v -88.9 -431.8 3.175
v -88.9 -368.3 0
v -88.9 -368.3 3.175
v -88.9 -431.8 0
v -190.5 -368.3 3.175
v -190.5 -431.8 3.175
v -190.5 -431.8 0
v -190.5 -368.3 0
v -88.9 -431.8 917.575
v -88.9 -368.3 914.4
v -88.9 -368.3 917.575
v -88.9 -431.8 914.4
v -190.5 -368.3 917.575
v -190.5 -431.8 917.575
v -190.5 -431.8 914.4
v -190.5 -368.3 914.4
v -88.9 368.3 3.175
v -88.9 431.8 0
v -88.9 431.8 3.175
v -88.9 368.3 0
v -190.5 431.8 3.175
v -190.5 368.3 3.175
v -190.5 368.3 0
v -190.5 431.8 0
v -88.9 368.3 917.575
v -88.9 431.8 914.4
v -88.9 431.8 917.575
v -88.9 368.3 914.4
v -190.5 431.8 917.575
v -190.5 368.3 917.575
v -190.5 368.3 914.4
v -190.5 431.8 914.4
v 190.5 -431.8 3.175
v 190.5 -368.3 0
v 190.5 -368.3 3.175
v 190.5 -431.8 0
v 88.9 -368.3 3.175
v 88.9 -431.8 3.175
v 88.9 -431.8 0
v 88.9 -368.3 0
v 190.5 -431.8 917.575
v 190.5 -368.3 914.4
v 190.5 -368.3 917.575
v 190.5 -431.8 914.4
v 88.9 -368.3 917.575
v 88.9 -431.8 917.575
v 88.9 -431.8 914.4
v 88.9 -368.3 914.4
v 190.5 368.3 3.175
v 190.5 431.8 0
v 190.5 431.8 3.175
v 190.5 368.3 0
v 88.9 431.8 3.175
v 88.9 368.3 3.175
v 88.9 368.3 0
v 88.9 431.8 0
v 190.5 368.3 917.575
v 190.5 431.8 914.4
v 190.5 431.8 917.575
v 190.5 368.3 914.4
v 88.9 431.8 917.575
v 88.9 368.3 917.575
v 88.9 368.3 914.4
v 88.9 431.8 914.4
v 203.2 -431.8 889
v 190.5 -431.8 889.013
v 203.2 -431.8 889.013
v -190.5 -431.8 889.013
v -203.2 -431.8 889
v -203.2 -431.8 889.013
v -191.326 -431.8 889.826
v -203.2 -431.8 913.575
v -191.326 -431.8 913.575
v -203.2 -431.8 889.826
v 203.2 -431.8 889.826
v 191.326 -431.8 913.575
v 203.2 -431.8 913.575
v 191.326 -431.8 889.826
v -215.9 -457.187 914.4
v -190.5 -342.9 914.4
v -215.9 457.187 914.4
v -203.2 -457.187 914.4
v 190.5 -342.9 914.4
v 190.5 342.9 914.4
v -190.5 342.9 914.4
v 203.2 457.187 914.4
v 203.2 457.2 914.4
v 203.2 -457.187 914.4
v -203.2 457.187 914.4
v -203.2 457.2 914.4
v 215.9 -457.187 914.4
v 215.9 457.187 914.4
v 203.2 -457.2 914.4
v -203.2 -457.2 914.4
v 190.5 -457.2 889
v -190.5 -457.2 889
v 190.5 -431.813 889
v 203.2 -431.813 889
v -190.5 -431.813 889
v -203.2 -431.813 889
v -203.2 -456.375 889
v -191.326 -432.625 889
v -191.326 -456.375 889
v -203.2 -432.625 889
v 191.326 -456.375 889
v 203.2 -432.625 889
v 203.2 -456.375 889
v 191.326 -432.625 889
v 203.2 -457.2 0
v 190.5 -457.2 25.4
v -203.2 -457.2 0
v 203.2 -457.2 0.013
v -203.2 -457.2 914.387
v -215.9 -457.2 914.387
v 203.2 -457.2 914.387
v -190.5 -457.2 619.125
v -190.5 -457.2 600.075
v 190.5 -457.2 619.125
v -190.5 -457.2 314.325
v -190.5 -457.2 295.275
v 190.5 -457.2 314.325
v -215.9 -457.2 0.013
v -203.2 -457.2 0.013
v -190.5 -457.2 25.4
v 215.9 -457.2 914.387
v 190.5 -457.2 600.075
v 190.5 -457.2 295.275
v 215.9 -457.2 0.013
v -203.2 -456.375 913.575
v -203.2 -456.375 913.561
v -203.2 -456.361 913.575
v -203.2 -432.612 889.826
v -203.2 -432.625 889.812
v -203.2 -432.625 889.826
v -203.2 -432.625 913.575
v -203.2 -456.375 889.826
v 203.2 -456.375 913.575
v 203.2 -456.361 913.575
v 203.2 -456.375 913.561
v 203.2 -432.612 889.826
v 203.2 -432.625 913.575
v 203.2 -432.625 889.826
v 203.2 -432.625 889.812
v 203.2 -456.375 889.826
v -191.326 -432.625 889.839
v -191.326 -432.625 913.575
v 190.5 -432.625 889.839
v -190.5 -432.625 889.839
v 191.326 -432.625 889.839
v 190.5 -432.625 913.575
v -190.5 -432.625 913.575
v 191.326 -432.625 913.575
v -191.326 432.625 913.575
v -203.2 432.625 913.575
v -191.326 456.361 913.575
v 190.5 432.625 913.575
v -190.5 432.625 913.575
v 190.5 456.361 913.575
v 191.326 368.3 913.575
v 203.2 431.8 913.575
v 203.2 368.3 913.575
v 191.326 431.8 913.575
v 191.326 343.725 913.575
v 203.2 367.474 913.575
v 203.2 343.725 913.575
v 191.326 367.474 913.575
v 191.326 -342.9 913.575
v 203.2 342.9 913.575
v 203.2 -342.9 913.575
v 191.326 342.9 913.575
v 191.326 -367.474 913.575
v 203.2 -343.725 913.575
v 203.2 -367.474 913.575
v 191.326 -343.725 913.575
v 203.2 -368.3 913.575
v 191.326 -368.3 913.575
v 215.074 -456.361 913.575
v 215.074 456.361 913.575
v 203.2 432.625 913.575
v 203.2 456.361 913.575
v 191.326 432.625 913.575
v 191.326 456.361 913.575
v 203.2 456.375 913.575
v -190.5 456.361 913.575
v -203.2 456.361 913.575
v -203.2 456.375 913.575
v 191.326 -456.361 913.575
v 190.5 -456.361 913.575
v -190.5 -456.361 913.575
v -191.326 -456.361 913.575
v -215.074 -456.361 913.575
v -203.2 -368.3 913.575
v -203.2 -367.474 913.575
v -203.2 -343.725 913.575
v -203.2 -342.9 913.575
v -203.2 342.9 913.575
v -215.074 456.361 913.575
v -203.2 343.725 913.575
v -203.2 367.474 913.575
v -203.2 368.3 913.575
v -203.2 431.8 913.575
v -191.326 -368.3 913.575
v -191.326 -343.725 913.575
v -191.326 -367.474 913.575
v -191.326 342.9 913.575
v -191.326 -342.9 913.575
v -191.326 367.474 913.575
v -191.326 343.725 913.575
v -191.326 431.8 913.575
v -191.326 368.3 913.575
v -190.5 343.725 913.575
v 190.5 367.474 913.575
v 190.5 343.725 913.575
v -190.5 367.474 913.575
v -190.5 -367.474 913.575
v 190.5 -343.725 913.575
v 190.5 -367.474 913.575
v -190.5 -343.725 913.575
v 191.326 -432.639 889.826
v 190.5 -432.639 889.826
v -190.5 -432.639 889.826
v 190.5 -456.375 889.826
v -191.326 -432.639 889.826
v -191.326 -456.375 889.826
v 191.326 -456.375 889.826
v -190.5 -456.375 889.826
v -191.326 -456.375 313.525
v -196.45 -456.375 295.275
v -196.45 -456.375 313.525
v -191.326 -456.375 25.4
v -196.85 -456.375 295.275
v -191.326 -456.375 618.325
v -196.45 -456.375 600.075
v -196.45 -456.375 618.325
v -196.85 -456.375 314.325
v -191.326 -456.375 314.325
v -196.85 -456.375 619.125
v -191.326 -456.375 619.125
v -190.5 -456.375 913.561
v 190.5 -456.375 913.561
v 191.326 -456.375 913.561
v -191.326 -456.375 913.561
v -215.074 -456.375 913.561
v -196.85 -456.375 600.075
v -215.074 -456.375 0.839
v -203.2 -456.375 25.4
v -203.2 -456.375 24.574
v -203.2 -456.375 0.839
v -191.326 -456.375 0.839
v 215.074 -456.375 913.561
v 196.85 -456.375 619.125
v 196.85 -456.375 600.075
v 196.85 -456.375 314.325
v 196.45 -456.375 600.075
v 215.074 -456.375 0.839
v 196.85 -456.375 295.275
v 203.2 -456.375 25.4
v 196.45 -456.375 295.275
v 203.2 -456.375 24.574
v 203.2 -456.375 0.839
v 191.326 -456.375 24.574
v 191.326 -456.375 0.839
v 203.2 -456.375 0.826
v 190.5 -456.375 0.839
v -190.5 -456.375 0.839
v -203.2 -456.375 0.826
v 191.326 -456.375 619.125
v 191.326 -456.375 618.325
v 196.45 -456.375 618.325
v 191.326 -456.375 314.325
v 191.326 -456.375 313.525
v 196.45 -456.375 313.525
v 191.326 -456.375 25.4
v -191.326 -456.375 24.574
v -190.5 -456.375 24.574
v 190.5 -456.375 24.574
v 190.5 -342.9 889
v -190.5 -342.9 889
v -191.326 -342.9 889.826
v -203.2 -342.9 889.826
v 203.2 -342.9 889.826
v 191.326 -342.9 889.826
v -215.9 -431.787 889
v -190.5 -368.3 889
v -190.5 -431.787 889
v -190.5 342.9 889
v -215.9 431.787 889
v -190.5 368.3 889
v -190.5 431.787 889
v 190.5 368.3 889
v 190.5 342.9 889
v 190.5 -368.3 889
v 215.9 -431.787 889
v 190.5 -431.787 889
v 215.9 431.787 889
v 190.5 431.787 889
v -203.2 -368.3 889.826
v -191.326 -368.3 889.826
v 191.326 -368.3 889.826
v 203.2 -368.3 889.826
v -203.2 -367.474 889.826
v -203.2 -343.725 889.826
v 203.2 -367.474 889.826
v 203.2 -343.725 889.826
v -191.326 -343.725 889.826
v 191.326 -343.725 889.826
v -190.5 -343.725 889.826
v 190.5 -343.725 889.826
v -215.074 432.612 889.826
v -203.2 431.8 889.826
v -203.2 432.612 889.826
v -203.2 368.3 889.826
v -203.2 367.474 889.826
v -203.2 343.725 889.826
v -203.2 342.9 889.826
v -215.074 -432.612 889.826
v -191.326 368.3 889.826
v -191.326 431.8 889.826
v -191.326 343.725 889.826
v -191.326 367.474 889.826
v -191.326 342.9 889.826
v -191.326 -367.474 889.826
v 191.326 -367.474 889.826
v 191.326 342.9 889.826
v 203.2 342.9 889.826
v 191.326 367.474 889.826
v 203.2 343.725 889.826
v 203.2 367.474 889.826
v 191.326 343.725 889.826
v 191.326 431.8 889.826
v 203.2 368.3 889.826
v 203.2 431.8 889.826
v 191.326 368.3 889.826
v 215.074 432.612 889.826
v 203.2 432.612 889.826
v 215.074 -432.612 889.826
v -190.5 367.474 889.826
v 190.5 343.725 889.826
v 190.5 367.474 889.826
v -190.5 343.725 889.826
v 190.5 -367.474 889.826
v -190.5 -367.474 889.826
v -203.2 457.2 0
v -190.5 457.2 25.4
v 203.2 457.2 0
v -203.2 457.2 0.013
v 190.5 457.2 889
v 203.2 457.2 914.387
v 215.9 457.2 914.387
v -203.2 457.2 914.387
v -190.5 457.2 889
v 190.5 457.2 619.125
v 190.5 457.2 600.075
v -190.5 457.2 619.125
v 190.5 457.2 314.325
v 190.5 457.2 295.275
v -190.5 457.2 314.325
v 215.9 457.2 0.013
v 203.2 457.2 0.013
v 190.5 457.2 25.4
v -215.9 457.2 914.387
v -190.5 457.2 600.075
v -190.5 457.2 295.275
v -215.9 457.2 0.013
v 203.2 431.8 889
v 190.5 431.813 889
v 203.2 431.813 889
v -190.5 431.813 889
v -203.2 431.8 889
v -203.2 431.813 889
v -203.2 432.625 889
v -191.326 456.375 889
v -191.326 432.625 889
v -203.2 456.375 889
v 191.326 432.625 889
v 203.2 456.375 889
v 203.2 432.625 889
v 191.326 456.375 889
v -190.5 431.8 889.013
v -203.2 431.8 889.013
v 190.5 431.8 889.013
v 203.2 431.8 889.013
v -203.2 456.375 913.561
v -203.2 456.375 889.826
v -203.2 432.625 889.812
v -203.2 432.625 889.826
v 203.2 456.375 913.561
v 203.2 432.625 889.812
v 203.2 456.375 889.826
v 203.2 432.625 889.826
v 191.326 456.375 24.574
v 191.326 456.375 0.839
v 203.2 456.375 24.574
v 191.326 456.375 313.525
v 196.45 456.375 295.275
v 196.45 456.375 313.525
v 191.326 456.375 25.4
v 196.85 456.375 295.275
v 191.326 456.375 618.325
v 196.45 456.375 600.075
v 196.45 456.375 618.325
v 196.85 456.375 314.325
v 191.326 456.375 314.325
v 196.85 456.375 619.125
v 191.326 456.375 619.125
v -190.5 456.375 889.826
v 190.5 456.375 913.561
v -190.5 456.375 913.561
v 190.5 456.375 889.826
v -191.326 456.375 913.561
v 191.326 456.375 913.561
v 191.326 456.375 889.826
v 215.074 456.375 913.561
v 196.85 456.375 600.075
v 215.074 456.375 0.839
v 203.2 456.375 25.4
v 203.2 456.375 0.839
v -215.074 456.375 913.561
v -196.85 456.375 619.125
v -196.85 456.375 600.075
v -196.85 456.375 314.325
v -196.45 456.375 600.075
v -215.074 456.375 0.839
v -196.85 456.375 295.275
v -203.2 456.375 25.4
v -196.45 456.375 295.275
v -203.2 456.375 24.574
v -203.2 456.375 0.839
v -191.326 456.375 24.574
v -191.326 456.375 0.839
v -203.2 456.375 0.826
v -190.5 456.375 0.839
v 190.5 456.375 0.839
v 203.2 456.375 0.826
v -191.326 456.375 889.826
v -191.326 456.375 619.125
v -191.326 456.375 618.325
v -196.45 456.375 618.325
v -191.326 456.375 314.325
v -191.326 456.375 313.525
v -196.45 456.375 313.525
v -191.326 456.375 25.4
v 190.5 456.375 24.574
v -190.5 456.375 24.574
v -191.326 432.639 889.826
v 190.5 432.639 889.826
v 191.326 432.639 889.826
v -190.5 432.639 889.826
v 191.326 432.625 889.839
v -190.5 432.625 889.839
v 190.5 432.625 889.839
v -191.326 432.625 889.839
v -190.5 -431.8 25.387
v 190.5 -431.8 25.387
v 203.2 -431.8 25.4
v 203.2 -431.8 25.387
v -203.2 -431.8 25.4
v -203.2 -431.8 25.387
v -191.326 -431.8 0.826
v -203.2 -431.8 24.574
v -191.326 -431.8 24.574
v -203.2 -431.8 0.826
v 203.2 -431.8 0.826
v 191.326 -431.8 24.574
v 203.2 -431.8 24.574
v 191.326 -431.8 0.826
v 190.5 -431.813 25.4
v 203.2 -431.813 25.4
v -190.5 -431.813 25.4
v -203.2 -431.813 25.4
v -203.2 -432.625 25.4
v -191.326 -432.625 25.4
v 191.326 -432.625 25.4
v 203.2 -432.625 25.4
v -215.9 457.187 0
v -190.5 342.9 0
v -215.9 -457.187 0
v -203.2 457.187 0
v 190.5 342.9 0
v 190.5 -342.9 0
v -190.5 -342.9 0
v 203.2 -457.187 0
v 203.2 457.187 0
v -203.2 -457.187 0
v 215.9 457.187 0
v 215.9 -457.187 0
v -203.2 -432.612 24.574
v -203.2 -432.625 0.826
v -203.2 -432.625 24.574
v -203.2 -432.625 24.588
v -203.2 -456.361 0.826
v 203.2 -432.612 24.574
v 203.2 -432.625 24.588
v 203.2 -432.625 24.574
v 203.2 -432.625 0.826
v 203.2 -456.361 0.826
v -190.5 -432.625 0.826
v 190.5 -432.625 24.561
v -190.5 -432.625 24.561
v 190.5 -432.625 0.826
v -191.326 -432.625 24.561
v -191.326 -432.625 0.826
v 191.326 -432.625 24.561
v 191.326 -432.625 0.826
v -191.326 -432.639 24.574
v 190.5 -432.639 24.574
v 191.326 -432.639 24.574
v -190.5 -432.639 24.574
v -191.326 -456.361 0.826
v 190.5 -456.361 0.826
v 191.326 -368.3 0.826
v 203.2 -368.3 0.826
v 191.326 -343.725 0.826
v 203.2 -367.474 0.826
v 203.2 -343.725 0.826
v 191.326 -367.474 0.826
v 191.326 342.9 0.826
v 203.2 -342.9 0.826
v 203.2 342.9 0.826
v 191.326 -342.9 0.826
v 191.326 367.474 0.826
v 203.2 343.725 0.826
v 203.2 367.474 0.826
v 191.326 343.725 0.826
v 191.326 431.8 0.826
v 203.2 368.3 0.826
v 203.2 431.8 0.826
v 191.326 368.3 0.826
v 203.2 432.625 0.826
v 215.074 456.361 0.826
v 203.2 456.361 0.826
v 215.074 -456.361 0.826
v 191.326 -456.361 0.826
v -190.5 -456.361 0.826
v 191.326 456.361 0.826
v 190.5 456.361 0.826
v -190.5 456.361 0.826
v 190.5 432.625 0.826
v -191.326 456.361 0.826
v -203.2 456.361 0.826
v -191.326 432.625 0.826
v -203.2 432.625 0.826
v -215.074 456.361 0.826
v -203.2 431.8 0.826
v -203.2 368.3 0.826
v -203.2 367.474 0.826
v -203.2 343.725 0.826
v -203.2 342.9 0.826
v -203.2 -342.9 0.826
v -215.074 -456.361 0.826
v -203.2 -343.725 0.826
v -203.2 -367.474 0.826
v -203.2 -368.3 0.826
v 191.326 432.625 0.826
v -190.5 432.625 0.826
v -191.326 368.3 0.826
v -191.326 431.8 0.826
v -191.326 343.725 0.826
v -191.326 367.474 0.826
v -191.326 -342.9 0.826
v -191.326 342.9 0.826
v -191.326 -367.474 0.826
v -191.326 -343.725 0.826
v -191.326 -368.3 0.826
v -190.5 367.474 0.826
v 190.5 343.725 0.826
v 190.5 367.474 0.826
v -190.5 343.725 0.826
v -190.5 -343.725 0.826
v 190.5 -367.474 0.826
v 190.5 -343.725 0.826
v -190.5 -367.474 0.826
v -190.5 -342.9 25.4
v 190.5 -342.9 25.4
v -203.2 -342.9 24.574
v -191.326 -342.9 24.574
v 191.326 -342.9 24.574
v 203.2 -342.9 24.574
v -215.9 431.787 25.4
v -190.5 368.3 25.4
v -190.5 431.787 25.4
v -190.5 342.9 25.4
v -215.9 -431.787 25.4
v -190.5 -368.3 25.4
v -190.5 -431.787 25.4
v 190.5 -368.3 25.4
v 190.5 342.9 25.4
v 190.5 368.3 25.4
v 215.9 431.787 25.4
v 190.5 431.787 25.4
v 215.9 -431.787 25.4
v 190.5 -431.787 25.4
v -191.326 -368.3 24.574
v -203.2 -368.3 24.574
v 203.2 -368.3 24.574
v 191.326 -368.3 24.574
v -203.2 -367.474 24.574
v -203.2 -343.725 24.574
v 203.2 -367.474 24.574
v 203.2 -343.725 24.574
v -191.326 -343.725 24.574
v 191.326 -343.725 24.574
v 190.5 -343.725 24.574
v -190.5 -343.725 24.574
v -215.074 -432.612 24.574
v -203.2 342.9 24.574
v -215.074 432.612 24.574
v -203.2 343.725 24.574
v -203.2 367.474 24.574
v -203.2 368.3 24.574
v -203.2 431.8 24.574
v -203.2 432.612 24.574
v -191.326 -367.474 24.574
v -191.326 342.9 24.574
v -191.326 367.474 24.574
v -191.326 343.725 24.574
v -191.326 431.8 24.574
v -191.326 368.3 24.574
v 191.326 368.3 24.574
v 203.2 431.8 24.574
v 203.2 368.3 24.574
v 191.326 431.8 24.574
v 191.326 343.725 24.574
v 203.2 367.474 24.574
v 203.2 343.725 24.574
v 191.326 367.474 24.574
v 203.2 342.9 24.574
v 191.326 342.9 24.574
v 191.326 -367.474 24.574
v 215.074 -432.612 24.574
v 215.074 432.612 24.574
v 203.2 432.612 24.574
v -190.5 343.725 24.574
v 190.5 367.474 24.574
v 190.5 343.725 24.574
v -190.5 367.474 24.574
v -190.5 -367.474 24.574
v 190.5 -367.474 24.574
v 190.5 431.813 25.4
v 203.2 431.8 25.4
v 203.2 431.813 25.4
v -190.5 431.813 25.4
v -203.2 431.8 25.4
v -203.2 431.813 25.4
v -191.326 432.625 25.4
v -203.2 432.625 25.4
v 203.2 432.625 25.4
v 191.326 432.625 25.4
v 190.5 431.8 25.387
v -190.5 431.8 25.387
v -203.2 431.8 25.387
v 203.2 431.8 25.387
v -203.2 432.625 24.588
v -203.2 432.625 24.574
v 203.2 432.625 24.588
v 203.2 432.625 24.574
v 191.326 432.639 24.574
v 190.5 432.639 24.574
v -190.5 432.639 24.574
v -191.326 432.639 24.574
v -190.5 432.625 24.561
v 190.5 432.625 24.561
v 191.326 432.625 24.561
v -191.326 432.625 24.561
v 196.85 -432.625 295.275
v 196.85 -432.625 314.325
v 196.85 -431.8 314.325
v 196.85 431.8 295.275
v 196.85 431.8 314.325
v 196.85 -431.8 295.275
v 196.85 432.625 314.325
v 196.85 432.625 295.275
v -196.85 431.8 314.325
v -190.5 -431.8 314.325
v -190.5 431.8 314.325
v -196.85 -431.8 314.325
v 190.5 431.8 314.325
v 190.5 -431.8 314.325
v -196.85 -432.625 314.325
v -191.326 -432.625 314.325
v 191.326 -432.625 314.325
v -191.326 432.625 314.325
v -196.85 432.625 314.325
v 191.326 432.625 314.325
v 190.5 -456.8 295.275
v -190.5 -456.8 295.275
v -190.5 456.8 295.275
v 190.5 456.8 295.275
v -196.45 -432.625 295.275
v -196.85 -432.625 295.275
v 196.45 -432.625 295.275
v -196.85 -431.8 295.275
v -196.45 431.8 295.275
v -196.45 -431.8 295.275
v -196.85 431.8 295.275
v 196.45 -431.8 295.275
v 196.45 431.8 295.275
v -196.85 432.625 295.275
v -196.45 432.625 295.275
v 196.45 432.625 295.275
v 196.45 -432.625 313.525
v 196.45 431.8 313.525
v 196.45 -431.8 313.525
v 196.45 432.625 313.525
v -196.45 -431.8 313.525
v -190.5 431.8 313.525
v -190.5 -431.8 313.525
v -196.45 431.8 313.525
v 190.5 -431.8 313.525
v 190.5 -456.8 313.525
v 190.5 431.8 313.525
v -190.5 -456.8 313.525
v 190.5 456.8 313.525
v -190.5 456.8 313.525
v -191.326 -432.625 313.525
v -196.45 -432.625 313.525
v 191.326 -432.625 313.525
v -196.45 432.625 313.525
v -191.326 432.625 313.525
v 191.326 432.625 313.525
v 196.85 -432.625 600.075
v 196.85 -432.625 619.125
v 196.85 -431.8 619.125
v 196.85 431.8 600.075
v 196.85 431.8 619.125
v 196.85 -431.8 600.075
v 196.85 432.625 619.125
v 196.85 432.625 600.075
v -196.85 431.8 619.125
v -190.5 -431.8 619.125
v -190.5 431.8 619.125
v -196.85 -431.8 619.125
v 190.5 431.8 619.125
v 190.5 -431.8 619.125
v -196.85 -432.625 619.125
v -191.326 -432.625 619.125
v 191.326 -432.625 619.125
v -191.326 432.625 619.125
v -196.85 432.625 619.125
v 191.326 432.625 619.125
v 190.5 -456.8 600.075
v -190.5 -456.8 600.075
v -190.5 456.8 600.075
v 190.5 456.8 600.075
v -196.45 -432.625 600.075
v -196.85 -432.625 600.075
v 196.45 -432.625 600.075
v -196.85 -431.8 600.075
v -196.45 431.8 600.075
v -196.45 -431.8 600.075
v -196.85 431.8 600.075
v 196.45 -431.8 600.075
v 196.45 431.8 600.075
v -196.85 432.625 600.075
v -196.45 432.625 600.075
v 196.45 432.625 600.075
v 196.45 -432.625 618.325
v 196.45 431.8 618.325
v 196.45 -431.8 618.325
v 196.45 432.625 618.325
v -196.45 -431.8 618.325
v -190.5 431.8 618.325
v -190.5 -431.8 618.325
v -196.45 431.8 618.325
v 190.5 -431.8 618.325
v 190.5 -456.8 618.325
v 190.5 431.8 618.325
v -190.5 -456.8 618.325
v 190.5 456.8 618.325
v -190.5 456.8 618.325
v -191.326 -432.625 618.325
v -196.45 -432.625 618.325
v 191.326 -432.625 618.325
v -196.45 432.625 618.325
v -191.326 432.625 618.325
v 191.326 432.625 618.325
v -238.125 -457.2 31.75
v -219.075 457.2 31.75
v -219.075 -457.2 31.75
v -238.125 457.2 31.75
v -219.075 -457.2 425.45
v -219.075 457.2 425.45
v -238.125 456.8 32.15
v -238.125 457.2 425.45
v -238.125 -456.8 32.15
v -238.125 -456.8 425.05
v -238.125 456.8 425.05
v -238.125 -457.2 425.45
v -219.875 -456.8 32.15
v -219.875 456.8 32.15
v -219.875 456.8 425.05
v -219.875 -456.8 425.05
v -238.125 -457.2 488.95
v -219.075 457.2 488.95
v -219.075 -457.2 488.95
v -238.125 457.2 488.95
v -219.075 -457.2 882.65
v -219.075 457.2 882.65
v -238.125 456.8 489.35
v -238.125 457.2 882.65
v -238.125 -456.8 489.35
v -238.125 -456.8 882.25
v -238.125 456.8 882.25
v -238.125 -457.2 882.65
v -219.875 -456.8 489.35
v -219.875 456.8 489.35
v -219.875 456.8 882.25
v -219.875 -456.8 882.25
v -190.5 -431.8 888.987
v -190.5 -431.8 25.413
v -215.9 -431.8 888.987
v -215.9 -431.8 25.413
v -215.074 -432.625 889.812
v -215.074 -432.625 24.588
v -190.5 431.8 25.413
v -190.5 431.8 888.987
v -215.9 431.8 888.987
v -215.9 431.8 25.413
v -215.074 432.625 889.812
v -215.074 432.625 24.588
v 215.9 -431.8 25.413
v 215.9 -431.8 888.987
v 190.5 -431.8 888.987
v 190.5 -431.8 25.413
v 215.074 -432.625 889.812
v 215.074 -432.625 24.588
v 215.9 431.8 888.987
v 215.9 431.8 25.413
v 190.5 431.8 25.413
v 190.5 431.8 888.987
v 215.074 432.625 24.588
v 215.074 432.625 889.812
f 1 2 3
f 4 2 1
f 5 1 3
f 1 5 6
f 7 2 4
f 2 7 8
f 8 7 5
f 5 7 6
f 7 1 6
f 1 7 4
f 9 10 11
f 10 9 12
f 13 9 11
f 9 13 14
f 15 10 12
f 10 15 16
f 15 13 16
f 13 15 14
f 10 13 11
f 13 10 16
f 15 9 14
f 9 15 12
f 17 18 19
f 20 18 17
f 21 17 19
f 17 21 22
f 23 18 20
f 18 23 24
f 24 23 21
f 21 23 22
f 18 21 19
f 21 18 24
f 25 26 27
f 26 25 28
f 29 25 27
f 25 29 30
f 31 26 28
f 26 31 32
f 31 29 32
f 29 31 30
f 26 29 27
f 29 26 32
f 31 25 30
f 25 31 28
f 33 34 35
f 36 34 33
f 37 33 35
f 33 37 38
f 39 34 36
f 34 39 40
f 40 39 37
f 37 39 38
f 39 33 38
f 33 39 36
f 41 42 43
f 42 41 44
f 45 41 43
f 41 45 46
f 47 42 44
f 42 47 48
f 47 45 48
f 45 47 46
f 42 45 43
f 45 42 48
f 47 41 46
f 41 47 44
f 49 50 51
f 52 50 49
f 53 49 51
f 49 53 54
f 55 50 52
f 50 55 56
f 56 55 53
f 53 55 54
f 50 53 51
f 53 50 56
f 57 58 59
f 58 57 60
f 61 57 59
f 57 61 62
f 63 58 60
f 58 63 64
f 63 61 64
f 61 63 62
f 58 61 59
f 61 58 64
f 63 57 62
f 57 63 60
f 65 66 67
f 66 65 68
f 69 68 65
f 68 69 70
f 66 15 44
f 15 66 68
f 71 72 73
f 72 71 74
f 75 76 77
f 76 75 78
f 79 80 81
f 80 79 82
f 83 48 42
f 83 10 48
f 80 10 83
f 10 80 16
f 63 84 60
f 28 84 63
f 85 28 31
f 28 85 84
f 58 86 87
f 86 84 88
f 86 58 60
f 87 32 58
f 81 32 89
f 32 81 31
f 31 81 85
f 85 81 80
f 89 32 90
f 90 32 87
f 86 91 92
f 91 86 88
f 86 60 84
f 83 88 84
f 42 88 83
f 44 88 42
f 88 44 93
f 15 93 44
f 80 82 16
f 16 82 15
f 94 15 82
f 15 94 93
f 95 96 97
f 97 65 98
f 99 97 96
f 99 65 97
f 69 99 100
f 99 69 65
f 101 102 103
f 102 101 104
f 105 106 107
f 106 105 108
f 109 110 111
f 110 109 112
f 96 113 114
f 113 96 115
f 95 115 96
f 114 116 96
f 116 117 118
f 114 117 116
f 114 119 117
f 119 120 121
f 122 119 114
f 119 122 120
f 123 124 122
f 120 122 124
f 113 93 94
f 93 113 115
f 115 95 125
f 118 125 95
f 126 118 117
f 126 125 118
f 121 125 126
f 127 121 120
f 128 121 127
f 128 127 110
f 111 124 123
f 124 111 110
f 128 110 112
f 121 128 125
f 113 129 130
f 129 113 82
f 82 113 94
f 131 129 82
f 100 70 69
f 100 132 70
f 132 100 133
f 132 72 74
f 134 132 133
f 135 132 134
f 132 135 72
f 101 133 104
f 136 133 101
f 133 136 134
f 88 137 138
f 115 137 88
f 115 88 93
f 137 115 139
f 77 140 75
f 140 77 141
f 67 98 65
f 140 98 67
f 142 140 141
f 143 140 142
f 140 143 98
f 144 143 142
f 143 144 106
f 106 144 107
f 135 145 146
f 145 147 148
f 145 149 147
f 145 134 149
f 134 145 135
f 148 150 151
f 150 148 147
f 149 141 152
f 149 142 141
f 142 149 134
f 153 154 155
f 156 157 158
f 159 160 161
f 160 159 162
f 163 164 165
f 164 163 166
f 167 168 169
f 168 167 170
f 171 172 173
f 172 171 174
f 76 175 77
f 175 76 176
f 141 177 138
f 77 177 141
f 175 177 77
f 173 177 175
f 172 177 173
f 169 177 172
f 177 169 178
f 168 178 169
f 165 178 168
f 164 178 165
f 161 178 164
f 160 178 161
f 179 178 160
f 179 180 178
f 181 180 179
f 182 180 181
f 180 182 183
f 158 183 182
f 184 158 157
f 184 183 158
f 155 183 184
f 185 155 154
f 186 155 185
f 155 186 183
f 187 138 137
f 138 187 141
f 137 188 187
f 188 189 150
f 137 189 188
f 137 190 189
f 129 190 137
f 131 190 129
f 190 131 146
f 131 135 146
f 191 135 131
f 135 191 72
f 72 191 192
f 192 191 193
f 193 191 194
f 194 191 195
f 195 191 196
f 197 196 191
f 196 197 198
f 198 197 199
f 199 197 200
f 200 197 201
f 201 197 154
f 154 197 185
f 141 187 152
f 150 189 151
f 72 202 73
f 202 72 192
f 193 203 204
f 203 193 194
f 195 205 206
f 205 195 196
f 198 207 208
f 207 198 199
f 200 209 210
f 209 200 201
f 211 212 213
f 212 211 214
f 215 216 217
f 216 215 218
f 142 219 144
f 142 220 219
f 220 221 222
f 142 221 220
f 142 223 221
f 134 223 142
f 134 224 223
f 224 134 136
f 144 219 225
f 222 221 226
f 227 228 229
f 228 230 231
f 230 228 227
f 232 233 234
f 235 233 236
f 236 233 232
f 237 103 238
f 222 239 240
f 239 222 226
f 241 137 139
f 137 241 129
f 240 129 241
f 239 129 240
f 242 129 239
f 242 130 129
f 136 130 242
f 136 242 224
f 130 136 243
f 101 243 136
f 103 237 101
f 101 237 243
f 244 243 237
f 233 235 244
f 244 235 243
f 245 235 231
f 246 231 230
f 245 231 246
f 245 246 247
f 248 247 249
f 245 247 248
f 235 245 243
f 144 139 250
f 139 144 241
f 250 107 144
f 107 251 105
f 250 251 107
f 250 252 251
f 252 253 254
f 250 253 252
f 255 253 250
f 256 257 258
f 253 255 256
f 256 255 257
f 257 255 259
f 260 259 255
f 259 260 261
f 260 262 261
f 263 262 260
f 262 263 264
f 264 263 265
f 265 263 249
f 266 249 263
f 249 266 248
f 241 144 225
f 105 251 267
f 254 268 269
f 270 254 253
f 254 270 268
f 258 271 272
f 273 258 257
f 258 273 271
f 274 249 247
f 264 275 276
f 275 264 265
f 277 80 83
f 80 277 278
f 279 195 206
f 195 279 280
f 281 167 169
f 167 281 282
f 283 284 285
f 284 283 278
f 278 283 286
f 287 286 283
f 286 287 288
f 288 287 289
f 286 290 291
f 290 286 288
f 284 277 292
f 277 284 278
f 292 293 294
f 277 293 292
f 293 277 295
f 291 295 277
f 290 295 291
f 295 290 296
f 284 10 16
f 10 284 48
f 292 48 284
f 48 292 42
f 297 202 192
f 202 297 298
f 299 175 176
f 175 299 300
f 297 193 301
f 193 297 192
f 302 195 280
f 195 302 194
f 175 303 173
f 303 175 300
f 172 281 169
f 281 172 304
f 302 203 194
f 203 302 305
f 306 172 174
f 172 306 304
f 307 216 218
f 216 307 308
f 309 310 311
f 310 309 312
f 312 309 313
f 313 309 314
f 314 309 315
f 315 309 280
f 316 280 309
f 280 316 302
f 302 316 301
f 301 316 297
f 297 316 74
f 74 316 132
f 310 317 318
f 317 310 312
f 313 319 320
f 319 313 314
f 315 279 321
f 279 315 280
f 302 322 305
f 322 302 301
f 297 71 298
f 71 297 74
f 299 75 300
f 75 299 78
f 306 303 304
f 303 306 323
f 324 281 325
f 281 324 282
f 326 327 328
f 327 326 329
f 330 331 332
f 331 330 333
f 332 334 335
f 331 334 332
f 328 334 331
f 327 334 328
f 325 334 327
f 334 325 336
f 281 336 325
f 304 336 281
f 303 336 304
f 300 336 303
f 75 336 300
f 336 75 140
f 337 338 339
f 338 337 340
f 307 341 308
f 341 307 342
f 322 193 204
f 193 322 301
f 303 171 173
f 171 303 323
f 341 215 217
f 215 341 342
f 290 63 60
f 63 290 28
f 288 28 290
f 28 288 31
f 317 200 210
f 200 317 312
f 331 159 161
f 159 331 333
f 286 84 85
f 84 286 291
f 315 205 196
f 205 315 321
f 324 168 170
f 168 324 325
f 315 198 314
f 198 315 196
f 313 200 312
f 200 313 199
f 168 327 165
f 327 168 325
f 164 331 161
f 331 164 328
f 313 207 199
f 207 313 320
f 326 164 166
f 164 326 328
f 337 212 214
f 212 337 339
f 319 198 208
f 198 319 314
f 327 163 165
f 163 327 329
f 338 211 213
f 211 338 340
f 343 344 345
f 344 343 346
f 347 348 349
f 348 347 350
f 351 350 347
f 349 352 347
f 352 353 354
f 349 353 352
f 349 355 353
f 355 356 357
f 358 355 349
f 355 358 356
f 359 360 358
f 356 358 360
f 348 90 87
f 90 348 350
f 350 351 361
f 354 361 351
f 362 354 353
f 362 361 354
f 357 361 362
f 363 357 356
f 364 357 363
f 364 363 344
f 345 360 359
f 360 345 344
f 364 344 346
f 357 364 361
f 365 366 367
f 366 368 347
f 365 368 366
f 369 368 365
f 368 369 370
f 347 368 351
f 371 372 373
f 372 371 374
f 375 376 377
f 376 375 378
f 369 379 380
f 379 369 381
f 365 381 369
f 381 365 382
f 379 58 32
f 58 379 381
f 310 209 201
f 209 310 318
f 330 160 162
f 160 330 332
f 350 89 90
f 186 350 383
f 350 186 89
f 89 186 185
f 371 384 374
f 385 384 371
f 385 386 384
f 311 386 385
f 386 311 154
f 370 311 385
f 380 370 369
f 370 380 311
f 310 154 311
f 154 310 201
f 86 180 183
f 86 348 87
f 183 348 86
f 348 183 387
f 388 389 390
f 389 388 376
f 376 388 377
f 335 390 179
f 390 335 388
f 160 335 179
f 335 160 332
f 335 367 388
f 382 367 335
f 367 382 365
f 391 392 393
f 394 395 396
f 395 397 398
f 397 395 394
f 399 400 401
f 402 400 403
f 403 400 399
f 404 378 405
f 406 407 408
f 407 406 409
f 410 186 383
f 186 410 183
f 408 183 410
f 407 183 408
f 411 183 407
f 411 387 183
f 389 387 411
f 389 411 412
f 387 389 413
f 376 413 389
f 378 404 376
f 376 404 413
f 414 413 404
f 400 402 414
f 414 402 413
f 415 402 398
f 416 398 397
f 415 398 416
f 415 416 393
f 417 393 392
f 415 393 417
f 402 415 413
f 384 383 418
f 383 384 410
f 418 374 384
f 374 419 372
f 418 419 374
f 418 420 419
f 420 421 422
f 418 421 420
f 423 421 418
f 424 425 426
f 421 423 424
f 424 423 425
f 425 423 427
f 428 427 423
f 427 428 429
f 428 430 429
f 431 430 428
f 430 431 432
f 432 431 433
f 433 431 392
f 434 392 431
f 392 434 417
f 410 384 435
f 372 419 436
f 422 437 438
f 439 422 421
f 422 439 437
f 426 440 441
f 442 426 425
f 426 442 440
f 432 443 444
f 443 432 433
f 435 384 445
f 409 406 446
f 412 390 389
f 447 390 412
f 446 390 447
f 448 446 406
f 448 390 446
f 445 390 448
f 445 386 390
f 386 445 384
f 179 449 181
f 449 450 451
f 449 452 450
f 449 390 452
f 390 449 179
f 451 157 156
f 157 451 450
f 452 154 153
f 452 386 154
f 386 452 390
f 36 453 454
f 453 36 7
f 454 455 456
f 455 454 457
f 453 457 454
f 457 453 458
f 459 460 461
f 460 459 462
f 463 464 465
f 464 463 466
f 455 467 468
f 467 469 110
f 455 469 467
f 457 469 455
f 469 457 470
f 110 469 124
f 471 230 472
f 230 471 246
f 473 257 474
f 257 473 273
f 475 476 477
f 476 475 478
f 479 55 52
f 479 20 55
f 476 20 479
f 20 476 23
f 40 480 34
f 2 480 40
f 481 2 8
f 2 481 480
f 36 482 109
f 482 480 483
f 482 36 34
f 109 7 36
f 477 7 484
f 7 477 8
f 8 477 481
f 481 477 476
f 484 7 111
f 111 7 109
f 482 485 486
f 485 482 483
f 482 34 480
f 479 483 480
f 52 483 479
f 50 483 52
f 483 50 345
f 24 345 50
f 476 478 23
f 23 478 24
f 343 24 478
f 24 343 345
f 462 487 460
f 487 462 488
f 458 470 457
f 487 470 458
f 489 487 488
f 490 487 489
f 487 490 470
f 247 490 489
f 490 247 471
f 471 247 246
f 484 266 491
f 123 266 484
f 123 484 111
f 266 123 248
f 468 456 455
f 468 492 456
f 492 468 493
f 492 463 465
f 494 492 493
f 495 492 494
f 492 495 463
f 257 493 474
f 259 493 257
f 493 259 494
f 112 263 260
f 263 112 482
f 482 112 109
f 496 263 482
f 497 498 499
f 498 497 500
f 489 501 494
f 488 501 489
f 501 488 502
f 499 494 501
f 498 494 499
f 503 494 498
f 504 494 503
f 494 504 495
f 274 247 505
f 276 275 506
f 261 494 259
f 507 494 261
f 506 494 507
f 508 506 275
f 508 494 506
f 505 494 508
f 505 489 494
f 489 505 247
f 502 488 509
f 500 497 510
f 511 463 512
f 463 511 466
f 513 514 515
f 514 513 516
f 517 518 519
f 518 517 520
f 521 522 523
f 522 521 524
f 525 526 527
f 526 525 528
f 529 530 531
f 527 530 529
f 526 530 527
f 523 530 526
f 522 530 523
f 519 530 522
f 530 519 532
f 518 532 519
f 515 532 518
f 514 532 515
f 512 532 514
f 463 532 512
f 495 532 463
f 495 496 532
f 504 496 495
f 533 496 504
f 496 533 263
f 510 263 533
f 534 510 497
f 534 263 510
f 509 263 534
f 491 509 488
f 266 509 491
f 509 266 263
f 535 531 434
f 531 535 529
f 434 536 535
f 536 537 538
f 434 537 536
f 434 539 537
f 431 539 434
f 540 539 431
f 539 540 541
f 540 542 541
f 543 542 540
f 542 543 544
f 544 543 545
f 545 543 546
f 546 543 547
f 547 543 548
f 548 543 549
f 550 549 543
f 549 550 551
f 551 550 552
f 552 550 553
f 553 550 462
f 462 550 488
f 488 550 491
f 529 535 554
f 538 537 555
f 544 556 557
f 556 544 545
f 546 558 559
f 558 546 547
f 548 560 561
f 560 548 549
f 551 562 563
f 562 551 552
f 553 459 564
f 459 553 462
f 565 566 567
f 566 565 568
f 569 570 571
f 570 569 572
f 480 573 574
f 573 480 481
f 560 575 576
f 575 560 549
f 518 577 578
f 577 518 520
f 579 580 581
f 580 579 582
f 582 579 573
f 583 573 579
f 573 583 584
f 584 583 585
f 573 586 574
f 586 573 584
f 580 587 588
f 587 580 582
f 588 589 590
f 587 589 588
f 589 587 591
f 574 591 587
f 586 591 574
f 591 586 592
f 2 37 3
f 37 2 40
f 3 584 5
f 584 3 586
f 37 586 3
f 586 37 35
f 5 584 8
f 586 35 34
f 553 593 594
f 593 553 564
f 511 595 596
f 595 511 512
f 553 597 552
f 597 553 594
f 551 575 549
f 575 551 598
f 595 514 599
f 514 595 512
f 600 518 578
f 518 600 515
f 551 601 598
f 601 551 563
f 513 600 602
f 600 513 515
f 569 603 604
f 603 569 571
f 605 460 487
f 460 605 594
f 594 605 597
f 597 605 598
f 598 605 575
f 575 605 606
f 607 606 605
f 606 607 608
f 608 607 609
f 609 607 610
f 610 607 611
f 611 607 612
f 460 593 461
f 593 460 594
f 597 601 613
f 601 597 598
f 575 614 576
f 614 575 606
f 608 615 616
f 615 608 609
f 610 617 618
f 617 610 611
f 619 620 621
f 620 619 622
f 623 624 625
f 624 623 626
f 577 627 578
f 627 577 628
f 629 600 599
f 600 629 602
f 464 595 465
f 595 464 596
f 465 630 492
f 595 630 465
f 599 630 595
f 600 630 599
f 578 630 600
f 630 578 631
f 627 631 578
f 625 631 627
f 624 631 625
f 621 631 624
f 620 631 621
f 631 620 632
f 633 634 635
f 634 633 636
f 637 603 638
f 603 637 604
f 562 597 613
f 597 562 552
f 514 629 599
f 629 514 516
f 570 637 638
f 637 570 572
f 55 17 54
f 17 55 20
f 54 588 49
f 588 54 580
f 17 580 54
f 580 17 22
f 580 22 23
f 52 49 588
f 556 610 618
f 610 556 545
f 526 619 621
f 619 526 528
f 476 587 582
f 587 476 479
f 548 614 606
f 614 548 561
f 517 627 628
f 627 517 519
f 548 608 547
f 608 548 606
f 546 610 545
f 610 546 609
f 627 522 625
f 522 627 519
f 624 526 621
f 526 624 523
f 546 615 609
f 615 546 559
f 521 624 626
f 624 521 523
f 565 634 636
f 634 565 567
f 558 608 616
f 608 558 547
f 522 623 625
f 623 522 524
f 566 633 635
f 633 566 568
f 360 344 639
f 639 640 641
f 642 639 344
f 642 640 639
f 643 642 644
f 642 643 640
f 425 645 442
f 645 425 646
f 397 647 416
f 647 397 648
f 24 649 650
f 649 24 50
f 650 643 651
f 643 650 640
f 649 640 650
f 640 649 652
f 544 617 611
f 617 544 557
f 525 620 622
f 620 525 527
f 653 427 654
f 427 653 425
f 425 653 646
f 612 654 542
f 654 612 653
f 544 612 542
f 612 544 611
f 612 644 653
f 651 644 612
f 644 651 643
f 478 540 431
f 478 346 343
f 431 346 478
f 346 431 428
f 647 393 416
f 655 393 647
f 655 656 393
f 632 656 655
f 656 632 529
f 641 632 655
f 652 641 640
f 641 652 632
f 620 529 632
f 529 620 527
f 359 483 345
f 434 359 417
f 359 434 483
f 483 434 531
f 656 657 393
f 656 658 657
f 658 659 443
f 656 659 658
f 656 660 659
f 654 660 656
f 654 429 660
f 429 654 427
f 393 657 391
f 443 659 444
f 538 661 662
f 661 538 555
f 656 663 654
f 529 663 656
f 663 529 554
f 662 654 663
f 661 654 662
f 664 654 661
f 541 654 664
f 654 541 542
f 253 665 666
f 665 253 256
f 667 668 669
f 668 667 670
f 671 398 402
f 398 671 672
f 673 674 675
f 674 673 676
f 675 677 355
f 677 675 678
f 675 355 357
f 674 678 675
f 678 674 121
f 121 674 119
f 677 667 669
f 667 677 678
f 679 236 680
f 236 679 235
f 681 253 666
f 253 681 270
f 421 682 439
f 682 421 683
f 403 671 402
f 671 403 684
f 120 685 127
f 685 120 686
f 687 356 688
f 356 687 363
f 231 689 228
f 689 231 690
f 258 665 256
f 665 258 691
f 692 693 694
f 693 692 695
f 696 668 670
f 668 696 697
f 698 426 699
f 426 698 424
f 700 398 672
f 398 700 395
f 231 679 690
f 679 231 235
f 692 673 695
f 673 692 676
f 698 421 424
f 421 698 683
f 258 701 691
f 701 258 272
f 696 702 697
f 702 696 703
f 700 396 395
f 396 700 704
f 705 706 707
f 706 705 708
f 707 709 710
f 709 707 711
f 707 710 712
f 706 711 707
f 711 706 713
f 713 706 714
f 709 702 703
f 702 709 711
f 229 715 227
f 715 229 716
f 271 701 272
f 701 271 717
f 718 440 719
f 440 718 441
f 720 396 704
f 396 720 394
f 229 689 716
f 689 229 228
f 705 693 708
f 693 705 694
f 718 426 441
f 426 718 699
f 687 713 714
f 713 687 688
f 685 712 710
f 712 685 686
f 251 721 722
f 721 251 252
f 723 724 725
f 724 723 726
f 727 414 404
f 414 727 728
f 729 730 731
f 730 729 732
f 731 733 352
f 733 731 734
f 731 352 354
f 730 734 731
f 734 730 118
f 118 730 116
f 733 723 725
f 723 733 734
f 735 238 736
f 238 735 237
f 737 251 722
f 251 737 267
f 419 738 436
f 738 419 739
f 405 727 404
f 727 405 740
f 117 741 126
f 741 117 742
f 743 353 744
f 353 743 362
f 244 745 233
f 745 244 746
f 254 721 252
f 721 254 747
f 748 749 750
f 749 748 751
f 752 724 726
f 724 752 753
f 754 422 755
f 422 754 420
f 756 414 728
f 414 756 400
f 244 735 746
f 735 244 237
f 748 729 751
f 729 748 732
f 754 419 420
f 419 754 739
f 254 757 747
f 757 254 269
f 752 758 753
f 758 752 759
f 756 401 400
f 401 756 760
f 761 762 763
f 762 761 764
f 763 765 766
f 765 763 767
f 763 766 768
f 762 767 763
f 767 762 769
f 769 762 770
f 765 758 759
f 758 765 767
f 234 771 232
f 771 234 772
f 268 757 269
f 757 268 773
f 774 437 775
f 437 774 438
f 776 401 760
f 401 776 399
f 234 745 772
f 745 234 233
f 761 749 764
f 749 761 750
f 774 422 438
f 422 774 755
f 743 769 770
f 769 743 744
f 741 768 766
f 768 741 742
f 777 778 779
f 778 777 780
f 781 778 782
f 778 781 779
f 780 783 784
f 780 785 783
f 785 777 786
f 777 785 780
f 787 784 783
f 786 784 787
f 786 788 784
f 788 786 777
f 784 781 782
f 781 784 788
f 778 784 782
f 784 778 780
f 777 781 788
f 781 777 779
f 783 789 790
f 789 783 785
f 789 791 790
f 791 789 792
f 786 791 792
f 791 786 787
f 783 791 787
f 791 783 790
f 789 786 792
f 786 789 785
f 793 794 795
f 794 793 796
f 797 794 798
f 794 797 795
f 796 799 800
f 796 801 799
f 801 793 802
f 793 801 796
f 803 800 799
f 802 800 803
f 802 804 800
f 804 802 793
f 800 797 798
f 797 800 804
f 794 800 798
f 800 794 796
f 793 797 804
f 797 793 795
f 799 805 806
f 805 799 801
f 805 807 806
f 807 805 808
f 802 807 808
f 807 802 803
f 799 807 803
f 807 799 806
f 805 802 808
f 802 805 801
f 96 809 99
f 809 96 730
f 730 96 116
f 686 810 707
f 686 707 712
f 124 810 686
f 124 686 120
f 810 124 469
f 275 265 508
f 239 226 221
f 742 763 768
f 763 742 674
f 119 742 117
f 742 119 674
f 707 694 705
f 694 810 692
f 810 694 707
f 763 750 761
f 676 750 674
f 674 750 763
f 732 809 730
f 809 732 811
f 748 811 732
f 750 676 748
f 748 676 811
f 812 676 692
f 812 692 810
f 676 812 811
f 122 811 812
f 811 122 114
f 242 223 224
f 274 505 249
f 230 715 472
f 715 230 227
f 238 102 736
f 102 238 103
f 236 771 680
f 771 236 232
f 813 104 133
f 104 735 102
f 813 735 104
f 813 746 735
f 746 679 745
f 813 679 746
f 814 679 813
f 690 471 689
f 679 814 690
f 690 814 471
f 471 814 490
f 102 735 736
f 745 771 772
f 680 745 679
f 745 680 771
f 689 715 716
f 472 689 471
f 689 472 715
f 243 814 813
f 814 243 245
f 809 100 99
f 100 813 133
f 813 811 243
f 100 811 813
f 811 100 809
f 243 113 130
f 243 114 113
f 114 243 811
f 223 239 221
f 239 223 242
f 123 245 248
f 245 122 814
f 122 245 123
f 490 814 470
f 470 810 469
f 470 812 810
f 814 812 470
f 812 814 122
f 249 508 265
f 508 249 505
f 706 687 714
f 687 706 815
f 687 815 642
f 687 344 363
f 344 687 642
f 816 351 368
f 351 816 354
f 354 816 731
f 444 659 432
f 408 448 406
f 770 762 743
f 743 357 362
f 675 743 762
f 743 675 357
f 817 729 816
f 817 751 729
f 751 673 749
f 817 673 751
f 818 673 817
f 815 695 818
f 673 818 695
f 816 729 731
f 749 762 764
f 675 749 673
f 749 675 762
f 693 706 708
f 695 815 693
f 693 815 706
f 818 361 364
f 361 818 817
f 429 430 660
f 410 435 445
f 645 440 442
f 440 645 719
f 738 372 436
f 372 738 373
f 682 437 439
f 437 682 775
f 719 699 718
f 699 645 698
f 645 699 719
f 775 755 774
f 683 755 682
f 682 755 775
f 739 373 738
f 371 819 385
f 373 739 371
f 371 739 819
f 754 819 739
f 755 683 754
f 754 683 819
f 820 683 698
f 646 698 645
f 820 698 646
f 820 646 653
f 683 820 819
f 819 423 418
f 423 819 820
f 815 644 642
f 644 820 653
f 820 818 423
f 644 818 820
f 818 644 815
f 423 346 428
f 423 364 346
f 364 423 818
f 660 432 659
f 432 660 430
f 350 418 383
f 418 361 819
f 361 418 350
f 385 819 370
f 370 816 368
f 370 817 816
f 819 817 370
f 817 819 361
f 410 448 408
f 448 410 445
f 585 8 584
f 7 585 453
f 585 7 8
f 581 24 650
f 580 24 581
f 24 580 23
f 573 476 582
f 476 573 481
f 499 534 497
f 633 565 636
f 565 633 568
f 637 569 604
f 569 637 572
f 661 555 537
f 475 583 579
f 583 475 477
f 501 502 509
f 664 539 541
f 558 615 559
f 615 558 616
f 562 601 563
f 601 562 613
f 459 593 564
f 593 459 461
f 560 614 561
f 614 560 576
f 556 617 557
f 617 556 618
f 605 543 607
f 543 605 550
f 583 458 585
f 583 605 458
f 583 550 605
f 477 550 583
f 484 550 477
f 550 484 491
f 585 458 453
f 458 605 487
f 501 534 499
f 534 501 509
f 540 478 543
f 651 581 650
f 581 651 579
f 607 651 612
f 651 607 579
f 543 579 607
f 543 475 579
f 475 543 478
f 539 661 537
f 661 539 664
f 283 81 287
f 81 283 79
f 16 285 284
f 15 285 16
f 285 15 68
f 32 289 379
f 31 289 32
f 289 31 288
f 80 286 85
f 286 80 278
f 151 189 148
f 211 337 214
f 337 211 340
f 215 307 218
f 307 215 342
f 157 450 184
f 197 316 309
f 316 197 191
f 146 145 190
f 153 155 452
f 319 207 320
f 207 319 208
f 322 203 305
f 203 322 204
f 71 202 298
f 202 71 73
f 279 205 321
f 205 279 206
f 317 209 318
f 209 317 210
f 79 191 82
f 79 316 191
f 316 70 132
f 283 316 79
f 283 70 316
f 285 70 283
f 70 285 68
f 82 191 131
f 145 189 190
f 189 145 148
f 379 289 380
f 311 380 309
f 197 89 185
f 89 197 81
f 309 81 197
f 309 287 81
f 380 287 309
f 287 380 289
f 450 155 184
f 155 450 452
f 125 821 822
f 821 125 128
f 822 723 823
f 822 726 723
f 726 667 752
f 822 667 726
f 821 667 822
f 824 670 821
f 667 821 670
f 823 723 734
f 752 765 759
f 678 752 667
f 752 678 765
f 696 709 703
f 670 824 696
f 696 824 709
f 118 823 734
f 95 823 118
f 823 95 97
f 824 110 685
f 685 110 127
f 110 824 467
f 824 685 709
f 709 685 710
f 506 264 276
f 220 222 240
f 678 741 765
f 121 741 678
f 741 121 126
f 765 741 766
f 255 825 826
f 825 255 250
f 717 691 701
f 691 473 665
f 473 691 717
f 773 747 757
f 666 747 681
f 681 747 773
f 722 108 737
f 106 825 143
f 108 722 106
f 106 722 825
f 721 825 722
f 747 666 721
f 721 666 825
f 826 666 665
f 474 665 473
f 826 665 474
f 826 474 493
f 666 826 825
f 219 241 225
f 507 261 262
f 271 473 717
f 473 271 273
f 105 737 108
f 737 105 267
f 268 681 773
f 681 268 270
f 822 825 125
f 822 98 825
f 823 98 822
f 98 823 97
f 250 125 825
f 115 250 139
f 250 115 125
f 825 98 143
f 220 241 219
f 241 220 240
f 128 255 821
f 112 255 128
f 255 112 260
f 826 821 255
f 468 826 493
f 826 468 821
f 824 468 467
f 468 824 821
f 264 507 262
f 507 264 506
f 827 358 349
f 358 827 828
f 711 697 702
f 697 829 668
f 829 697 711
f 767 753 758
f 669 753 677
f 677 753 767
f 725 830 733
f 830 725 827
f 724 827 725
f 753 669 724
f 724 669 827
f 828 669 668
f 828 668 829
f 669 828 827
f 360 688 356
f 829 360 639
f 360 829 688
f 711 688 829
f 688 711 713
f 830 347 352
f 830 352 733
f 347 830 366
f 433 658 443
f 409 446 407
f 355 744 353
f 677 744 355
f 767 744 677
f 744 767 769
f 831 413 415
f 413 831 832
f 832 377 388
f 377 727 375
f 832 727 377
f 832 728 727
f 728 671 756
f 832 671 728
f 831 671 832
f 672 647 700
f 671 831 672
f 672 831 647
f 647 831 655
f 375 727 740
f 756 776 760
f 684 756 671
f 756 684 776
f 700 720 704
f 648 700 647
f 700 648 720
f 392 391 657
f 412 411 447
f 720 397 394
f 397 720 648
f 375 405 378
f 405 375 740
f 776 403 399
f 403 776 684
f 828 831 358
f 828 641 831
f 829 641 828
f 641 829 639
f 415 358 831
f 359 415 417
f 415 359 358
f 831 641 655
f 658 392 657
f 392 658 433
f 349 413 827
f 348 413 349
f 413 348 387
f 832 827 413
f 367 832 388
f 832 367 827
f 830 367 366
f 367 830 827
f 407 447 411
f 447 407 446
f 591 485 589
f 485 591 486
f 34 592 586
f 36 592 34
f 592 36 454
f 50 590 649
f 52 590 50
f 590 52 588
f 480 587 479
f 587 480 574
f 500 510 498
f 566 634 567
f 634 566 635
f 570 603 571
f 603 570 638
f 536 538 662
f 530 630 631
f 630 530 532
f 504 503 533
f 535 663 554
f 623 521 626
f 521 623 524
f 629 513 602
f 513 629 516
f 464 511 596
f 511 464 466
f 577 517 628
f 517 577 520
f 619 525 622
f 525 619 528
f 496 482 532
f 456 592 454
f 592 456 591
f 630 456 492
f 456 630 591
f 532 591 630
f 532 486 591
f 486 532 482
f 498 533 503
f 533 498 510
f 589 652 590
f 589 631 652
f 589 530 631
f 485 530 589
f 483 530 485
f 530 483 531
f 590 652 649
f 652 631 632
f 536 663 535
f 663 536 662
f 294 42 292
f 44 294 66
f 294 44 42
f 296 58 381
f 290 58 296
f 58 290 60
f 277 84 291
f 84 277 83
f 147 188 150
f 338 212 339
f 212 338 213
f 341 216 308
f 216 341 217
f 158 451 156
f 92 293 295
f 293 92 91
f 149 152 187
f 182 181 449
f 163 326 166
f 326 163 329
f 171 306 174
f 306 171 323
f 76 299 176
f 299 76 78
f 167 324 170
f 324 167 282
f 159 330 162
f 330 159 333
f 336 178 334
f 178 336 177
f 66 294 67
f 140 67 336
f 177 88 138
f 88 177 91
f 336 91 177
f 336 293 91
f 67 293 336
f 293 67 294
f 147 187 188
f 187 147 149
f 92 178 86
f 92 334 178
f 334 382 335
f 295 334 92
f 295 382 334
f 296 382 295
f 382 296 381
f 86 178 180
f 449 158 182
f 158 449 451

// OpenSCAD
module tube(length=30, width=1, depth=1){
    difference(){
        cube([width*25.4,length*25.4,depth*25.4], center=true);
        cube([(width*25.4)-1.651,(length*25.4)+2,(depth*25.4)-1.651], center=true);
    }
}

module main_tube(){
    difference(){
        tube(36);
        for(Y=[-1,1]) translate([0,((18*25.4)+8.5)*Y,0]) rotate([45*Y,0,0])
            cube([30,30,90], center=true);
    }
}

module upright_frame(){
    for(Y=[-1,1]) translate([0,(17.5*25.4)*Y,(18*25.4)]) rotate([90*Y,0,0]) main_tube();
    translate([0,0,(0.5*25.4)]) rotate([0,0,0]) main_tube();
    translate([0,0,(35.5*25.4)]) rotate([0,180,0]) main_tube();
}

module shelf(width=36, depth=15.5, height=0.75){
    color("grey")
    difference(){
        cube([depth*25.4,width*25.4,height*25.4], center=true);
        translate([0,0,-0.8]) cube([(depth*25.4)-0.8,(width*25.4)-0.8,height*25.4], center=true);
    }
}

module plate(length=2.5, width=4){
    translate([0,0,(3.175/2)]) color("silver") cube([width*25.4,length*25.4,3.175], center=true);
}

for(X=[-1,1], Y=[-1,1], Z=[0,36]) translate([(5.5*25.4)*X,(15.75*25.4)*Y,Z*25.4]) plate();
for(Y=[-17.5, -14, 14, 17.5]) translate([0,Y*25.4,(35.5*25.4)]) rotate([0,0,90]) tube(length=16);


for(Y=[-17.5, -14, 14, 17.5]) translate([0,Y*25.4,(0.5*25.4)]) rotate([0,0,90]) tube(length=16);

for(Z=[12, 24]) translate([0,0,(Z*25.4)]) shelf();

for(Z=[0, 18]) translate([-(9*25.4), 0, (9*25.4)+(Z*25.4)]) rotate([0,90,0]) shelf();

for(X=[-1,1]) translate([(8*25.4)*X,0,0]) upright_frame();
